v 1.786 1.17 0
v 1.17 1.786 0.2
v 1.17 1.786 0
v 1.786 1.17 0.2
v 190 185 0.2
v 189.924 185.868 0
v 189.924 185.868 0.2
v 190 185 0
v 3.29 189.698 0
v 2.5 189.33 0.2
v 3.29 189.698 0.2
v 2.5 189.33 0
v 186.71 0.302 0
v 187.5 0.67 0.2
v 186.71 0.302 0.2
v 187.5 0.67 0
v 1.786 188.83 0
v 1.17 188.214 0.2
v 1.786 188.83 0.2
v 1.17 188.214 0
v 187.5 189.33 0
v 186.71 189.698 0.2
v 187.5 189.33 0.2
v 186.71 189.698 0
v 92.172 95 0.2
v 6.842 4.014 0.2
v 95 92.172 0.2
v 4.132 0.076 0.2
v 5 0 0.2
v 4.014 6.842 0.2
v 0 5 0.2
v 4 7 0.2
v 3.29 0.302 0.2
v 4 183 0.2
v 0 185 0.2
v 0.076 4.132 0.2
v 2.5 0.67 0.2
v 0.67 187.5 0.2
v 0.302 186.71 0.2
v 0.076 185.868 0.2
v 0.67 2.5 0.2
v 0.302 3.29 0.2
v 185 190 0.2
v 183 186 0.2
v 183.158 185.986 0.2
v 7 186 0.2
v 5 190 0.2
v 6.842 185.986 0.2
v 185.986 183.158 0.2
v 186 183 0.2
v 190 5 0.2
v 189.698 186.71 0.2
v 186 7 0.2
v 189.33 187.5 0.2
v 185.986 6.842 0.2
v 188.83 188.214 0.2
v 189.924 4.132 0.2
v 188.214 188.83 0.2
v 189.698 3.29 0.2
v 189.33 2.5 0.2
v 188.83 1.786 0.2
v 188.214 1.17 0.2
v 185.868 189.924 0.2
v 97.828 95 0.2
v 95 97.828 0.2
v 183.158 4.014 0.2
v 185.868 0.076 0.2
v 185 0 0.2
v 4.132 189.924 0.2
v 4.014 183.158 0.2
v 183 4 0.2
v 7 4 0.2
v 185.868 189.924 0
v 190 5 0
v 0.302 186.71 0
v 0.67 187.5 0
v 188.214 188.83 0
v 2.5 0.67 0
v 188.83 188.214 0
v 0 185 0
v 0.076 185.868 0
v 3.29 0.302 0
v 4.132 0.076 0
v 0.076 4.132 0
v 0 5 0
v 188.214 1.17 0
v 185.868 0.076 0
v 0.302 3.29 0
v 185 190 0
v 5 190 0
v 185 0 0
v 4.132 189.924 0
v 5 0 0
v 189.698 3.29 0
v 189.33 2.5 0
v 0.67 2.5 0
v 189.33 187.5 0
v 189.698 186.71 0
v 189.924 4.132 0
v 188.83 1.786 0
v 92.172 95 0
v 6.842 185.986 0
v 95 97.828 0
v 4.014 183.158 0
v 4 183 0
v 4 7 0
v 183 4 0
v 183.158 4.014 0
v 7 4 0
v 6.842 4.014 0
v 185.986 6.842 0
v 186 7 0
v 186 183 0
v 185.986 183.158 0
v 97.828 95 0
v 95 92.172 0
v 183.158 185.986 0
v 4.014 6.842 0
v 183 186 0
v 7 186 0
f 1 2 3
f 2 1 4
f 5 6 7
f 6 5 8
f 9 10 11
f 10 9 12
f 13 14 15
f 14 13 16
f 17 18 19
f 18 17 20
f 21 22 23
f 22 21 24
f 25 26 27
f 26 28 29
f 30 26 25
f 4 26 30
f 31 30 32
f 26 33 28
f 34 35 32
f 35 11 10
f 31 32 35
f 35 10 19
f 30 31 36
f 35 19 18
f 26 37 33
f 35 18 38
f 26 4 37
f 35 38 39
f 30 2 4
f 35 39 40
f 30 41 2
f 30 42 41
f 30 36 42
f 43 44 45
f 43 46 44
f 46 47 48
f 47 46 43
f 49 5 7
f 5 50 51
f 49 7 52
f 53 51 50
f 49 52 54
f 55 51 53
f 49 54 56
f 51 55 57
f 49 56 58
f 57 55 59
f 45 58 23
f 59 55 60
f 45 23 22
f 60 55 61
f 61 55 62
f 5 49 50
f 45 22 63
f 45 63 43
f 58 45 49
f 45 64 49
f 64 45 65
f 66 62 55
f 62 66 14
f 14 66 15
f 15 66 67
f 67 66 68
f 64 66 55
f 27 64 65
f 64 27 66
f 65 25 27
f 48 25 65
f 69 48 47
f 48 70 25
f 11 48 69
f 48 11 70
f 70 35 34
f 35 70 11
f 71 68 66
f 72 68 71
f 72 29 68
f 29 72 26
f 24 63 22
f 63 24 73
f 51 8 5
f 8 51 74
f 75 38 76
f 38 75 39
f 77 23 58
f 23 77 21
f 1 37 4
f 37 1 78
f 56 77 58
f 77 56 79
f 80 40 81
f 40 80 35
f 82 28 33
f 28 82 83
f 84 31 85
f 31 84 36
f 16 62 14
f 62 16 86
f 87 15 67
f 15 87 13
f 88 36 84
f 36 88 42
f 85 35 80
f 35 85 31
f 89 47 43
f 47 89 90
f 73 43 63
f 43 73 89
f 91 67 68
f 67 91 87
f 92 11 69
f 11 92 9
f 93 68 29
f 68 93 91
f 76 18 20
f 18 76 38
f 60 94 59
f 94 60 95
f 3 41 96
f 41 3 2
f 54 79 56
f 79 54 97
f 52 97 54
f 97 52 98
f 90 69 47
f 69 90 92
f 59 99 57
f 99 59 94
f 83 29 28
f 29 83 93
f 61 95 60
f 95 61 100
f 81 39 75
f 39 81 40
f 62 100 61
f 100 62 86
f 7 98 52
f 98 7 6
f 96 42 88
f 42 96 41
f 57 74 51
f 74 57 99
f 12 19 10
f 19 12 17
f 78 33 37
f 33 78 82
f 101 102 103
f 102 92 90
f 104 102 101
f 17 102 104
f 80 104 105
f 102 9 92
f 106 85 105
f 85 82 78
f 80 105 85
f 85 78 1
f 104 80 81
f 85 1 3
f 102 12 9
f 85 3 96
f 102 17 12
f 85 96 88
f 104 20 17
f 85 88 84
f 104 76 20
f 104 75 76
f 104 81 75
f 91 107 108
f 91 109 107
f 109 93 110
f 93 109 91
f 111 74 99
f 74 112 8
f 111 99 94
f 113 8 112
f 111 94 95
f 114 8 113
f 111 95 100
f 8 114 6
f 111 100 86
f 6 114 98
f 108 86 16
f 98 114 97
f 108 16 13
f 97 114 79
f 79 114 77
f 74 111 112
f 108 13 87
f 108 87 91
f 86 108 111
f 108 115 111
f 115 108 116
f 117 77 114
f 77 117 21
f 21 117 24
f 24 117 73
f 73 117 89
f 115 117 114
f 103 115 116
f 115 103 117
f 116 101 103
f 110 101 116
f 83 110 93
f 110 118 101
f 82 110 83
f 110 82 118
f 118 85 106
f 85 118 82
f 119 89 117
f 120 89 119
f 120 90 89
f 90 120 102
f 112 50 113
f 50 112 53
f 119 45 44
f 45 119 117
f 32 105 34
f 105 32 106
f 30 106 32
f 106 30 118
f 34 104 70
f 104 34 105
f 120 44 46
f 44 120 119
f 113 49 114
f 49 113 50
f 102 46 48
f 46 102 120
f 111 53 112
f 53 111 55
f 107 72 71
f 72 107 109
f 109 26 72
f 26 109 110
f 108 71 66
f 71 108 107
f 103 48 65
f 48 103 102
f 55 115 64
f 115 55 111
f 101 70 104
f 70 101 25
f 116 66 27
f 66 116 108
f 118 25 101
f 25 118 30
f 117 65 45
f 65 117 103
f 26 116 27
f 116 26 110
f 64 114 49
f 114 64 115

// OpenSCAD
$fn = 36;
SIZE_X = 190;
SIZE_Y = 190;
SIZE_Z = 0.2;

ROUNDING = 10;

OUTER_WALL_THICKNESS = 4;
INNER_WALL_THICKNESS = 4;


module roundedBase(OFFSET, X, Y, Z) {
    RADIUS = OFFSET / 2;
    X1 = RADIUS;
    X2 = X - OFFSET;
    Y1 = RADIUS;
    Y2 = Y - OFFSET;

    resize([X, Y, Z]) {
        translate([X1, Y1, 0]) {
            minkowski() {
                cube([X2, Y2, Z]);
                cylinder(r = RADIUS, h = Z);
            }
        }
    }
}

module cross(KOEF = 1) {
    CROSS_SIZE_X = sqrt( pow(SIZE_X, 2) + pow(SIZE_Y, 2) );
    CROSS_SIZE_Y = INNER_WALL_THICKNESS;
    CROSS_SIZE_Z = SIZE_Z;

    ANGLE = asin( SIZE_Y / CROSS_SIZE_X );

    translate([SIZE_X / 2, SIZE_Y / 2, 0])
        rotate([0, 0, ANGLE * KOEF])
            translate([0, 0, CROSS_SIZE_Z/2])
                resize([CROSS_SIZE_X - OUTER_WALL_THICKNESS * 1.5, CROSS_SIZE_Y, CROSS_SIZE_Z])
                    cube([CROSS_SIZE_X, CROSS_SIZE_Y, CROSS_SIZE_Z], center = true);
}

union() {
    cross(-1);
    cross();
    difference() {
        roundedBase(ROUNDING, SIZE_X, SIZE_Y, SIZE_Z);
        translate([OUTER_WALL_THICKNESS, OUTER_WALL_THICKNESS, 0])
            roundedBase(ROUNDING - OUTER_WALL_THICKNESS, SIZE_X - OUTER_WALL_THICKNESS * 2, SIZE_Y - OUTER_WALL_THICKNESS * 2, SIZE_Z);
    }
}
/* difference() {
linear_extrude(SIZE_Z)
    offsetSquare(ROUNDING, SIZE_X, SIZE_Y);

linear_extrude(SIZE_Z)
    translate([OUTER_WALL_THICKNESS, OUTER_WALL_THICKNESS, 0])
        offsetSquare(ROUNDING - 1, SIZE_X - OUTER_WALL_THICKNESS * 2, SIZE_Y - OUTER_WALL_THICKNESS * 2);
} */
